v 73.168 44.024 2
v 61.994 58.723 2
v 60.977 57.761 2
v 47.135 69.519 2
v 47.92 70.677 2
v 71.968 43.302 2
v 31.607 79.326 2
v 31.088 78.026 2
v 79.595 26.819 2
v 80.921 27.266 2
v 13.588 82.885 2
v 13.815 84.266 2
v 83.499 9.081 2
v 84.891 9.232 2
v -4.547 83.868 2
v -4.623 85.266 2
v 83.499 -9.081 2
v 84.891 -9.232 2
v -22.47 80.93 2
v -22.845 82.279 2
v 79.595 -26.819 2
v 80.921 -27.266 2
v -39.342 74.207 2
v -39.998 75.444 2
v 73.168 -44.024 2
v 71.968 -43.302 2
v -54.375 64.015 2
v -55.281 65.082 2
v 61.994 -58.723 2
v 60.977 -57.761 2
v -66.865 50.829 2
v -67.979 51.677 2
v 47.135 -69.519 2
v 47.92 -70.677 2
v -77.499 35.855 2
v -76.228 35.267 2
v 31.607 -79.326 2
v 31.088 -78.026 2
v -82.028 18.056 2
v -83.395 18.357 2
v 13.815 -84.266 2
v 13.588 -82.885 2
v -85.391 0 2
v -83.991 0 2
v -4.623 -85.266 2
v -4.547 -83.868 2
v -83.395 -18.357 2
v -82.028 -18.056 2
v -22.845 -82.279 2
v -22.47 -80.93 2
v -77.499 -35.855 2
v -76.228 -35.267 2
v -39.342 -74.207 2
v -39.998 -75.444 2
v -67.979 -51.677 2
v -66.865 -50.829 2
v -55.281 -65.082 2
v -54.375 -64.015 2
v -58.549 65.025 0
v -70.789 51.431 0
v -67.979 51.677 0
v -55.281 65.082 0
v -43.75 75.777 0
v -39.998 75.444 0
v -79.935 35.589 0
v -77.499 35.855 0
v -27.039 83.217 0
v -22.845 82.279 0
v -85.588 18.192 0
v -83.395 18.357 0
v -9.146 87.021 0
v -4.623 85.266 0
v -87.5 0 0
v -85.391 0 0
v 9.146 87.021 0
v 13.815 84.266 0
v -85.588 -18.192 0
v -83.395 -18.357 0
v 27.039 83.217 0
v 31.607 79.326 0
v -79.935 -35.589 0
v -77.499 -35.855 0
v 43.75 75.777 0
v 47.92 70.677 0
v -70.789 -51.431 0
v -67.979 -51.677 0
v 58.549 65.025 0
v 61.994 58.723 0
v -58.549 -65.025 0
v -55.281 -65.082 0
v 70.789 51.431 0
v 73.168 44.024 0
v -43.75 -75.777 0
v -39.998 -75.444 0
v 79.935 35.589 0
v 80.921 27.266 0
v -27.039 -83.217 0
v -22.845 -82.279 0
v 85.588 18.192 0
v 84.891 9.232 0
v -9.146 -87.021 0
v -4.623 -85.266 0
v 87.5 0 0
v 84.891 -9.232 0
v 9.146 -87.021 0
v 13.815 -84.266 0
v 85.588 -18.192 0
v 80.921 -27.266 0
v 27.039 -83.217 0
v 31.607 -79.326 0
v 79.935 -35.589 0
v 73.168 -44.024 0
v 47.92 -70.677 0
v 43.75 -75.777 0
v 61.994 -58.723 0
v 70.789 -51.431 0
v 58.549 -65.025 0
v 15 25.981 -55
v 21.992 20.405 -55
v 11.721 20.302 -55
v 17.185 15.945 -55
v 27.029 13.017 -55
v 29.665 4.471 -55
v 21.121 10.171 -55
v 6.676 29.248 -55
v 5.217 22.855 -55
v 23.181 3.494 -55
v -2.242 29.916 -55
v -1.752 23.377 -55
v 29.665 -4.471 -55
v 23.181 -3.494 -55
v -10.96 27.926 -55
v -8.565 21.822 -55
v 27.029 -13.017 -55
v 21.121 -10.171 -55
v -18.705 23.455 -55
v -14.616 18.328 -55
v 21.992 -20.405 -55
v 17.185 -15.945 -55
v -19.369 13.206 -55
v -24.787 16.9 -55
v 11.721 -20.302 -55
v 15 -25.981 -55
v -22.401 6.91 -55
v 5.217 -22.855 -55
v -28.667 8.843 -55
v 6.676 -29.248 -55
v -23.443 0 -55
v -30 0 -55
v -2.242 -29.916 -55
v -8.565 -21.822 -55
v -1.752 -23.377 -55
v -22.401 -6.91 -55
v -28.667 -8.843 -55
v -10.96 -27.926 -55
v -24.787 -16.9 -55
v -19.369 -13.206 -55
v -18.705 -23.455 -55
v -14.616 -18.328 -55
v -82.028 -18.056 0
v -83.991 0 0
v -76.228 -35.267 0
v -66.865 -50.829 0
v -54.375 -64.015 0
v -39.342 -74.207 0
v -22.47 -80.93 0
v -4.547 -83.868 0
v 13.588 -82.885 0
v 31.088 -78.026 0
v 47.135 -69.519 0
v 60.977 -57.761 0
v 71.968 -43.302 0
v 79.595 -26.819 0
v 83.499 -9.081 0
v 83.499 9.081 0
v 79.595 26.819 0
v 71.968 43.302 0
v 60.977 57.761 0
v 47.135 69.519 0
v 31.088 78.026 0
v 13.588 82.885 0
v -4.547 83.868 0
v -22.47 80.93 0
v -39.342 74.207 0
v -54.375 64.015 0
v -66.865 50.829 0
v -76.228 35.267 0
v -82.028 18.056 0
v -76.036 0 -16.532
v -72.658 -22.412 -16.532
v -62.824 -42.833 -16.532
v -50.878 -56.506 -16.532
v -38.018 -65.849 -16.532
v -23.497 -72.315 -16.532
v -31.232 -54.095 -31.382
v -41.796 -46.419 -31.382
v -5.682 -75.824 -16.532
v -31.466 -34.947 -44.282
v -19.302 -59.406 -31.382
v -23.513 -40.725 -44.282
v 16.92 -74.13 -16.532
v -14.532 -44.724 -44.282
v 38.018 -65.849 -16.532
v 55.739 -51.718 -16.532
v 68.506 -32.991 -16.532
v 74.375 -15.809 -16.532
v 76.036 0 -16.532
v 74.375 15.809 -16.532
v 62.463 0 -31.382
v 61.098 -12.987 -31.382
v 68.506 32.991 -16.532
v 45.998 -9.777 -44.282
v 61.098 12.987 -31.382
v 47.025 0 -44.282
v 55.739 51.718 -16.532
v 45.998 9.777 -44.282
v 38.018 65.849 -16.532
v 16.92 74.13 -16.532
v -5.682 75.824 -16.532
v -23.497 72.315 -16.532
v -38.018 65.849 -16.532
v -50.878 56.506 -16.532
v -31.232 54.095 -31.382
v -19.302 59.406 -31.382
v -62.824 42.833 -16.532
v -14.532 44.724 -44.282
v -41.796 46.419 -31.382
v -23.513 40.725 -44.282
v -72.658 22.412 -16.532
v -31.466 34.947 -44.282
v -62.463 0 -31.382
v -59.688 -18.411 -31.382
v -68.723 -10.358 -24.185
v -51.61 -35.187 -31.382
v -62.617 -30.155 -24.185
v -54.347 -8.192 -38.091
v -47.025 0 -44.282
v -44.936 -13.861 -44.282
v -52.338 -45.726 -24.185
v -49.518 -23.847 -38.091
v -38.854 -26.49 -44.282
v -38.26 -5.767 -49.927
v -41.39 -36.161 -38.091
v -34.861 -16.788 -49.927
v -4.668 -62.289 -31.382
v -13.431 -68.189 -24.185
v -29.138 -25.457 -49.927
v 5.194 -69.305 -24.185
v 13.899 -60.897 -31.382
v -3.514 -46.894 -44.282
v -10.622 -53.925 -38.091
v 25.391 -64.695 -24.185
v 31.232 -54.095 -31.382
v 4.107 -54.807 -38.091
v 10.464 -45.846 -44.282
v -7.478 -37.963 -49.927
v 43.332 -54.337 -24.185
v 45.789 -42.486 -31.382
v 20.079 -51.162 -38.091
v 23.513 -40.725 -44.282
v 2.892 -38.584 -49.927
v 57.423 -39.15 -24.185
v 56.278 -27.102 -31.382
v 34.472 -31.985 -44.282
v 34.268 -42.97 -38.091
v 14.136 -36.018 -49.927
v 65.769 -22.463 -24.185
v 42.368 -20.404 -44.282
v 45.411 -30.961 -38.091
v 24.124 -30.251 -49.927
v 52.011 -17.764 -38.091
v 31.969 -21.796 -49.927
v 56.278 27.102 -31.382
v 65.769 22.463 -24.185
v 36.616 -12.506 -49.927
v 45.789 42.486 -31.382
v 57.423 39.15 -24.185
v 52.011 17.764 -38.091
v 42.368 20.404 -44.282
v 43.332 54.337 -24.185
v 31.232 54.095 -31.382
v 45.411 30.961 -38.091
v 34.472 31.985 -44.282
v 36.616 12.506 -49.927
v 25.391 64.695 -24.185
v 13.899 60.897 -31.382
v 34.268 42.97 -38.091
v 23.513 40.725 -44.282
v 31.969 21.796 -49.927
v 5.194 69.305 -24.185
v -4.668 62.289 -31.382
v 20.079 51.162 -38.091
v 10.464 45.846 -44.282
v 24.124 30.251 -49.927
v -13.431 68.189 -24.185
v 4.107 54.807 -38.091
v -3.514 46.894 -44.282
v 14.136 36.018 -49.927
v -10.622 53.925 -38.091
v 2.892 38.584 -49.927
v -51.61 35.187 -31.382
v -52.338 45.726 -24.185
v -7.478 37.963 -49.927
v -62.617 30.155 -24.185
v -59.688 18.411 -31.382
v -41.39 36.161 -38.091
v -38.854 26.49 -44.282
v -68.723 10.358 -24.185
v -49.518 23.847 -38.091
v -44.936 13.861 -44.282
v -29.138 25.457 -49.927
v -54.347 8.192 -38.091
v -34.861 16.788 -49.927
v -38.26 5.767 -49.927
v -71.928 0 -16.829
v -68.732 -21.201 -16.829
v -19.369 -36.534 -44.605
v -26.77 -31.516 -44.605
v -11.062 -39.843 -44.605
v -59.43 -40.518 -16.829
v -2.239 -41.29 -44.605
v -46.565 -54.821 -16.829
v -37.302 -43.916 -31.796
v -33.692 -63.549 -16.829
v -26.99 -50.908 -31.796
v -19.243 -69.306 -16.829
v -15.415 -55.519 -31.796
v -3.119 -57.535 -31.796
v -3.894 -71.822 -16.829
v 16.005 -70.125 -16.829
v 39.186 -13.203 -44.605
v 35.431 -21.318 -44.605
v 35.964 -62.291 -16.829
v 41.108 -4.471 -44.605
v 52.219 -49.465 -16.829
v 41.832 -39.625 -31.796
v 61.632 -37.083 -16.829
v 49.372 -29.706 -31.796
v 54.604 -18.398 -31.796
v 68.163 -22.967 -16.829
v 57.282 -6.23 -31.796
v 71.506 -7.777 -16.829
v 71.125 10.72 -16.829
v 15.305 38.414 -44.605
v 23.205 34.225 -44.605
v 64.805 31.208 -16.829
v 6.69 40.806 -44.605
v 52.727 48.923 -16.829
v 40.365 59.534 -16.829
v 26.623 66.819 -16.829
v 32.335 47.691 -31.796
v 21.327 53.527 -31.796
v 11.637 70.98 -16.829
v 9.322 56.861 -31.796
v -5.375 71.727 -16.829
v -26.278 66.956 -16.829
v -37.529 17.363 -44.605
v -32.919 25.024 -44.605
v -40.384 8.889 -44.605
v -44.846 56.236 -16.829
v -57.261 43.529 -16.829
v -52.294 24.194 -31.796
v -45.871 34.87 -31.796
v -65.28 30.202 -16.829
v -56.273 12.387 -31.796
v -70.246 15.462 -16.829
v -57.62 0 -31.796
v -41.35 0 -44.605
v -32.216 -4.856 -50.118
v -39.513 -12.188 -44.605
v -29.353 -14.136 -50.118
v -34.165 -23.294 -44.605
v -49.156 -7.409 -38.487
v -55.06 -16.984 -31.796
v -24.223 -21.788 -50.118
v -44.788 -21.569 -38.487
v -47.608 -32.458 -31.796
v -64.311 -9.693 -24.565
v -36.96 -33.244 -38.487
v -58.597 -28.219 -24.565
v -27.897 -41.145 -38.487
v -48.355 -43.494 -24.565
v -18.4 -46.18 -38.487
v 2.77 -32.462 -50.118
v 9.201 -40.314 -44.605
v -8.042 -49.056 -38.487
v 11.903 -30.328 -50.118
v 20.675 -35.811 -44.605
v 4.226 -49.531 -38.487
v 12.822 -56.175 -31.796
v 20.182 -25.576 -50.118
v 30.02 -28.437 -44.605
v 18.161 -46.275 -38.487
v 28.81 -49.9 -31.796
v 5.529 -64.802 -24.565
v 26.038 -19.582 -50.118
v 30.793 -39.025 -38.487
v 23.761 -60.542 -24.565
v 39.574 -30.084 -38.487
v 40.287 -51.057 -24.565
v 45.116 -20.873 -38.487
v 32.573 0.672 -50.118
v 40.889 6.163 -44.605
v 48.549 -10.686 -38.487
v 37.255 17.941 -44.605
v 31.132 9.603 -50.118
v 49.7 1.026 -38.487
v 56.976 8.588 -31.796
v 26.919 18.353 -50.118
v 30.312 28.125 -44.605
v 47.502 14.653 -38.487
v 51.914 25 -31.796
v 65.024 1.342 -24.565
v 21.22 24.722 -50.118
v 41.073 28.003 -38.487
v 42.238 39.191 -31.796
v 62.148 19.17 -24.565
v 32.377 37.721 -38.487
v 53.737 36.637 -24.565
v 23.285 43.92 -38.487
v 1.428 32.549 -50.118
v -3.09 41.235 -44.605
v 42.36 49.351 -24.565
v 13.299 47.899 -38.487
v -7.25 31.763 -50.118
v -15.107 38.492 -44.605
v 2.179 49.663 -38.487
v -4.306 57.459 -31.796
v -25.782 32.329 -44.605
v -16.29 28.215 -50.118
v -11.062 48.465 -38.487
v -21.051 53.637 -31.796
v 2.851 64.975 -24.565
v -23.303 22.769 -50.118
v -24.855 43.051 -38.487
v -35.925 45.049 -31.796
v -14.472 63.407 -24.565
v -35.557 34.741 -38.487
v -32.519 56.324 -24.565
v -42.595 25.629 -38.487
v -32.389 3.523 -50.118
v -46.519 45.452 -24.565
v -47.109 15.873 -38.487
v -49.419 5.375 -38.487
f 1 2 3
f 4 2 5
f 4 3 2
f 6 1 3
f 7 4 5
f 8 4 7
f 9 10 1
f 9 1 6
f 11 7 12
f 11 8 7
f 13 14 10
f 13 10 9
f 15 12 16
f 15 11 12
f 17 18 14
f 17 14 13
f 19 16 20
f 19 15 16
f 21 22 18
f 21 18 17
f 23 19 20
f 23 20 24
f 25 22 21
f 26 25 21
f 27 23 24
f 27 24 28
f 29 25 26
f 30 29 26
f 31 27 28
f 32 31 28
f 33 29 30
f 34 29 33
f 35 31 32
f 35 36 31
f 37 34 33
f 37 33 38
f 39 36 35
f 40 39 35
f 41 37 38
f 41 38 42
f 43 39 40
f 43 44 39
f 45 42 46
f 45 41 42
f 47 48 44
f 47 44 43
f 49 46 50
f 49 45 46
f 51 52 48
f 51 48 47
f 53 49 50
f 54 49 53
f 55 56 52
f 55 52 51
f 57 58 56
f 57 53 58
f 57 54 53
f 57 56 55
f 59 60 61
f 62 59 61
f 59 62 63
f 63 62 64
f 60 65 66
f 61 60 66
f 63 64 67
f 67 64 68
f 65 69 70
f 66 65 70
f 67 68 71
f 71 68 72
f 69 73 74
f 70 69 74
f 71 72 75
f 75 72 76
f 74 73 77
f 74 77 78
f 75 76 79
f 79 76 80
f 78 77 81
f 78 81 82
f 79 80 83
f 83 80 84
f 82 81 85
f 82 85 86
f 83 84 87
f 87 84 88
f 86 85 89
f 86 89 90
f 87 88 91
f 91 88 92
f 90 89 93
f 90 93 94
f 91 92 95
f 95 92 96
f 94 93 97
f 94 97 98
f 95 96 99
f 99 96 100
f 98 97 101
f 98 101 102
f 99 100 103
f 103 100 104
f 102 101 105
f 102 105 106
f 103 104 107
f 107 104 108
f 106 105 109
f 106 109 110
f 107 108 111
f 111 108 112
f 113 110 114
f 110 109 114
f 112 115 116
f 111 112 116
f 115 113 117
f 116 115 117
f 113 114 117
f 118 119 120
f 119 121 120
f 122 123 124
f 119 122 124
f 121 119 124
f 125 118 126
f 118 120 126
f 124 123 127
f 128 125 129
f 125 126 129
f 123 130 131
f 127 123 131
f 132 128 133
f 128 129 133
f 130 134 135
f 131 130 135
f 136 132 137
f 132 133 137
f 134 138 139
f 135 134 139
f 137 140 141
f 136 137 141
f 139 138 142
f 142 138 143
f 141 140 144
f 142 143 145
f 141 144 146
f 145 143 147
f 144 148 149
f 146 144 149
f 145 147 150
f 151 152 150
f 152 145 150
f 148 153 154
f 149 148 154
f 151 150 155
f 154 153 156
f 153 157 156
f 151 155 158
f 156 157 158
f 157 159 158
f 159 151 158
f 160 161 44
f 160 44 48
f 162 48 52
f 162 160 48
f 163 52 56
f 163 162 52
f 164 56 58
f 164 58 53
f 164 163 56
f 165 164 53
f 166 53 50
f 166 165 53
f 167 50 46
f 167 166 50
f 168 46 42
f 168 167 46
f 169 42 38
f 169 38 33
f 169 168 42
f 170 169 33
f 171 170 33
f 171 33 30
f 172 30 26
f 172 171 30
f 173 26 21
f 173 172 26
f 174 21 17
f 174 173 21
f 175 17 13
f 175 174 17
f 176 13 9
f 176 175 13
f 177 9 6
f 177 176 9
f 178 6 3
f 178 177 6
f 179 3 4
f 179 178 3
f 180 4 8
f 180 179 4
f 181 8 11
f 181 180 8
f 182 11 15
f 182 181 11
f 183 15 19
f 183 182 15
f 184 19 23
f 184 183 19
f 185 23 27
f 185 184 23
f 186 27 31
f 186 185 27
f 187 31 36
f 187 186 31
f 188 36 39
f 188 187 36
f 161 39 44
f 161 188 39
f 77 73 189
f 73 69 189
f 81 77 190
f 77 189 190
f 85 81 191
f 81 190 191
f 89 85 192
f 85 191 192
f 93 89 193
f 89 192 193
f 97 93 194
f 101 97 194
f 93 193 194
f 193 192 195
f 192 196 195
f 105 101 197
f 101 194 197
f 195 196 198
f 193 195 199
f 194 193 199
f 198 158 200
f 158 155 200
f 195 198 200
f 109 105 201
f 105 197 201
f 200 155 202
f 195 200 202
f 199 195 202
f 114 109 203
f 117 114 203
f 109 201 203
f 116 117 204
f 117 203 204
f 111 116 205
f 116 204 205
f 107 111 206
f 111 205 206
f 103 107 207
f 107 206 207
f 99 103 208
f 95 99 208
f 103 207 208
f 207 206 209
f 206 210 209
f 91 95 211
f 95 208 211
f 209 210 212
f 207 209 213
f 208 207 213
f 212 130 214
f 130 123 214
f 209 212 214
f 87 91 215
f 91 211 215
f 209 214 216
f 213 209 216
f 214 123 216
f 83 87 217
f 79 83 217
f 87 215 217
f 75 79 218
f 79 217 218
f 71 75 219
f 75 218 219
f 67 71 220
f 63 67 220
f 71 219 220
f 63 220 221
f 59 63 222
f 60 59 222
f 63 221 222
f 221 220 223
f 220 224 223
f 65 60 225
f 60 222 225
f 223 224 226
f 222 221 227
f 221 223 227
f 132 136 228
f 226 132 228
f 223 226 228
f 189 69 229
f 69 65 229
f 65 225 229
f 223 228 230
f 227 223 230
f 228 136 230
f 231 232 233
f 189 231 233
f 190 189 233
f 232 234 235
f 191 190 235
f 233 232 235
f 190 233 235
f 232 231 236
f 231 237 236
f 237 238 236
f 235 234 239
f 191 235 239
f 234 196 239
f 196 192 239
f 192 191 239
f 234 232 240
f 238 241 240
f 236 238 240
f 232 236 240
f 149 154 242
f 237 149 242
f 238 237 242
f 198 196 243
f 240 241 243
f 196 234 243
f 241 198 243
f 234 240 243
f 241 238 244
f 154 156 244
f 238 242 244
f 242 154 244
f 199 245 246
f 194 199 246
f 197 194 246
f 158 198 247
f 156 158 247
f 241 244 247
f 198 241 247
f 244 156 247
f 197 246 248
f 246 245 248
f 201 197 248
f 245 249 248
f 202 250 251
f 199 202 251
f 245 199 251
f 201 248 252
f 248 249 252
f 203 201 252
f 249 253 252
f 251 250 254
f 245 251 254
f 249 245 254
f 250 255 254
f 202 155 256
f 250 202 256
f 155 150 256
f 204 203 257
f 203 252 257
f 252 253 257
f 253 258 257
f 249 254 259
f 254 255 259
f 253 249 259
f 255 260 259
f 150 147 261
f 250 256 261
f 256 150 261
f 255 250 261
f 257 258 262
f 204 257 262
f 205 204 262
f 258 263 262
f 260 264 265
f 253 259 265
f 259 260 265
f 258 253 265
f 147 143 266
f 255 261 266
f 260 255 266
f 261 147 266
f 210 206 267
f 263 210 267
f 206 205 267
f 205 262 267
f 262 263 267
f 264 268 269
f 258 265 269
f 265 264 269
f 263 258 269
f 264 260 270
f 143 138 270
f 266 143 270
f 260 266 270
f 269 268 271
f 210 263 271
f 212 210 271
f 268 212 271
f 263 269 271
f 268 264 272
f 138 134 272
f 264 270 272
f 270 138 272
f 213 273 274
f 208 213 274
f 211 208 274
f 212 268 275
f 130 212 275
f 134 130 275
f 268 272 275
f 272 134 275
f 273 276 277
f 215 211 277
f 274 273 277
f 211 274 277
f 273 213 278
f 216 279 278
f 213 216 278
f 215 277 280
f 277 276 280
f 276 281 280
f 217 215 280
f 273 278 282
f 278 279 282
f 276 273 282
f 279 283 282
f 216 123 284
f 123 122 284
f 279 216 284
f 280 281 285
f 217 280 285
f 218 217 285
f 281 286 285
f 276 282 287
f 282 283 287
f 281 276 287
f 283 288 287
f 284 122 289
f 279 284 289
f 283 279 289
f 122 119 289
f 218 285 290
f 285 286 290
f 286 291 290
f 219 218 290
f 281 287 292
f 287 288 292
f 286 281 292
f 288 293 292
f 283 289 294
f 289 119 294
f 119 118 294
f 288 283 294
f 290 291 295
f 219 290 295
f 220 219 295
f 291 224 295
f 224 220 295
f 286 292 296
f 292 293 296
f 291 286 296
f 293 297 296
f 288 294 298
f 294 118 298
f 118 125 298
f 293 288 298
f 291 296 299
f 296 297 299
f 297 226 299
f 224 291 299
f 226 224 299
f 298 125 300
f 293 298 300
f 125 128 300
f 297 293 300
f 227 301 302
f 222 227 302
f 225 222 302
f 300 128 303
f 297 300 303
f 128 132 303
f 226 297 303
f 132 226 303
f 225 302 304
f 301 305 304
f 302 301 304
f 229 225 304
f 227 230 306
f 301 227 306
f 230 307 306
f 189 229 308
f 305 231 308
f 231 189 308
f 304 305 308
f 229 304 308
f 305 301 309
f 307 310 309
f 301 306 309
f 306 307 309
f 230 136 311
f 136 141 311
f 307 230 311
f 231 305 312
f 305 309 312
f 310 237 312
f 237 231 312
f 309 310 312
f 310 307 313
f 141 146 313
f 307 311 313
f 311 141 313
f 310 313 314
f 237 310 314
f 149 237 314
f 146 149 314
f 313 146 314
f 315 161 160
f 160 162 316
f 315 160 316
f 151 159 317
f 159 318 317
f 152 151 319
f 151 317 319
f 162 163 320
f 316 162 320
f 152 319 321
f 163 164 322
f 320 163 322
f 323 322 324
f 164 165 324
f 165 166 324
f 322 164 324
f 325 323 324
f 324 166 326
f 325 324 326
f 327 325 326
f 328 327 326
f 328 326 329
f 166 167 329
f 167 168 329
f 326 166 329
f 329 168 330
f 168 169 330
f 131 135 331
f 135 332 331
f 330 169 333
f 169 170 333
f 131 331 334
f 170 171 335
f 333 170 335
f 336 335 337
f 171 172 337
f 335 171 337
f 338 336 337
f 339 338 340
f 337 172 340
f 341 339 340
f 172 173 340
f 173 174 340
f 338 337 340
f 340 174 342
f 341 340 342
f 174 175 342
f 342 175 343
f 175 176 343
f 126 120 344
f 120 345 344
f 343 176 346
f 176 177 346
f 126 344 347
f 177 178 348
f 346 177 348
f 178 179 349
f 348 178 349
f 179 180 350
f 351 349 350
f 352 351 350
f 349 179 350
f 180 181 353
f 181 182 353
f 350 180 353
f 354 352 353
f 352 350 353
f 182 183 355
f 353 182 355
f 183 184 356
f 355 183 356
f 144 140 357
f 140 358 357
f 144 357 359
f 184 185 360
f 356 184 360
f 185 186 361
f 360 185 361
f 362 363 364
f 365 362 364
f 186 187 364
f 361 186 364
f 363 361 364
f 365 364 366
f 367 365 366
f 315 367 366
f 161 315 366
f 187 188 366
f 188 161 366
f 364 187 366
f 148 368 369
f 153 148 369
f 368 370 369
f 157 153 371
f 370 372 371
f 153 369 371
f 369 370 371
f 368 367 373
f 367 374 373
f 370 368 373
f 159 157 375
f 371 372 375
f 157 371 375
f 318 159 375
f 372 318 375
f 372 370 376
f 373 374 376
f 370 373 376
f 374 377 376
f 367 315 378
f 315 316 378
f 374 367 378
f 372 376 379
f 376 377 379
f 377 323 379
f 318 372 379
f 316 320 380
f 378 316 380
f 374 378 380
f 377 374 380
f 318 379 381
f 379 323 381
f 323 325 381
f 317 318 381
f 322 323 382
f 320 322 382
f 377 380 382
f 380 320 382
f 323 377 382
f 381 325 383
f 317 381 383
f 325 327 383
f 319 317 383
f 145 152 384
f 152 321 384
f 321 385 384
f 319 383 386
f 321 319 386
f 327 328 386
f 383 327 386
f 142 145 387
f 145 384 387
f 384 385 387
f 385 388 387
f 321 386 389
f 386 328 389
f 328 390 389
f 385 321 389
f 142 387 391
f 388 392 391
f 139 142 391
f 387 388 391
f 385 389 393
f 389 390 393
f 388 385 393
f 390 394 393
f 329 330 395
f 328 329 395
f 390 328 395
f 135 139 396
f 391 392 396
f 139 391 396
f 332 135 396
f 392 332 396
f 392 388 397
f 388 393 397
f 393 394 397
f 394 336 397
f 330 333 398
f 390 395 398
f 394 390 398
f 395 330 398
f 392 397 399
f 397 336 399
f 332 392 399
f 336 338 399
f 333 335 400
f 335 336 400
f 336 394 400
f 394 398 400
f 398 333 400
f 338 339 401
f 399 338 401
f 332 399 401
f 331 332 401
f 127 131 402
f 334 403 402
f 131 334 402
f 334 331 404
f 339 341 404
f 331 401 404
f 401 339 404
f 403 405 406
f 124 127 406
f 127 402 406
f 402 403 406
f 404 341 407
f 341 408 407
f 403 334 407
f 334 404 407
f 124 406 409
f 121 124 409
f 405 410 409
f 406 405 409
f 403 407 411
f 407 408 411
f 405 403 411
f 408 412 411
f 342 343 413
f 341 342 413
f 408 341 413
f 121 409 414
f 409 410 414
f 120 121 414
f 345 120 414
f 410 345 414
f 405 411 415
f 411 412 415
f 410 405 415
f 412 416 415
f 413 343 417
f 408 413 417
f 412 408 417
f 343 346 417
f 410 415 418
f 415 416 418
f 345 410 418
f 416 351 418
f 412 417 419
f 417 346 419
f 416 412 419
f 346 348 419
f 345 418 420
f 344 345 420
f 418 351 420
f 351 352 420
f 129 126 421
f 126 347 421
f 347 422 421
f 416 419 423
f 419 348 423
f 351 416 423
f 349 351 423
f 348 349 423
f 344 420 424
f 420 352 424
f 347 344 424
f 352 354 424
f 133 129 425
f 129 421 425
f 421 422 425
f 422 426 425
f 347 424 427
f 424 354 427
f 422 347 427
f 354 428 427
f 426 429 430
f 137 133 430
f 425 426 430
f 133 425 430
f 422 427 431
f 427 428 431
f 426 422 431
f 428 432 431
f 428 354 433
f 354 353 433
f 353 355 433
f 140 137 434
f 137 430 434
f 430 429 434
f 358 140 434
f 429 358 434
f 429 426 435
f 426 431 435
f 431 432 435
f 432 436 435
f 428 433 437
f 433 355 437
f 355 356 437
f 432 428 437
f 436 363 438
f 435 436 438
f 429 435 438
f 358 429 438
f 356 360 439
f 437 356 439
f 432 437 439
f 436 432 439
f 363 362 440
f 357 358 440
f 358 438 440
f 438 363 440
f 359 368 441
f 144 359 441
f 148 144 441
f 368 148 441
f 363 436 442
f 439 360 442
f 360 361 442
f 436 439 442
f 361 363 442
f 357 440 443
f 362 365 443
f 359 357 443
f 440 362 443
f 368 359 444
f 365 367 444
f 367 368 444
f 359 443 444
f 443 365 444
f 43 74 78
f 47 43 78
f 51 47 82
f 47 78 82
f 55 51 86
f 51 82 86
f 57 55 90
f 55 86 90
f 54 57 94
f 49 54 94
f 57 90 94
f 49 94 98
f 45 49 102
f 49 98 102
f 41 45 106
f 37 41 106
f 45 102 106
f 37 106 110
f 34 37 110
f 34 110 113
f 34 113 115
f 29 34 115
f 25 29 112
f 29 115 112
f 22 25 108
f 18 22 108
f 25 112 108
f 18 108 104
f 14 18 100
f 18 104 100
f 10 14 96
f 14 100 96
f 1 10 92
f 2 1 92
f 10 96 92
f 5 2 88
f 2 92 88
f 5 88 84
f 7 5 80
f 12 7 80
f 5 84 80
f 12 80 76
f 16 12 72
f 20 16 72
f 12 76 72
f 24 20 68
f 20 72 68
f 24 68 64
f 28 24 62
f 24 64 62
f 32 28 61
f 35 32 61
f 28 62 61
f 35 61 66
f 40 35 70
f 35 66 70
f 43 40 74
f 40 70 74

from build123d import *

# Parameters (mm, degrees)
SKETCH4_R           = 85.391174644
SKETCH4_R_2         = 83.991174644
BOSS_EXTRUDE1_DEPTH = 2


with BuildPart() as part:
    # Sketch2 → Revolve1 (revolve)
    with BuildSketch(Plane(origin=(0, 0, 0), x_dir=(1, 0, 0), z_dir=(0, 1, 0)), mode=Mode.PRIVATE) as revolve1_sk:
        with BuildLine():
            Line((30, 55), (23.442880624, 55))
            ThreePointArc((23.442880624, 55), (57.619715582, 31.796383588), (83.991174644, 0))
            Line((83.991174644, 0), (87.5, 0))
            ThreePointArc((87.5, 0), (62.463417443, 31.382209145), (30, 55))
        make_face()
    revolve(revolve1_sk.sketch.rotate(Axis((0, 0, -55), (0, 0, 1)), 180), axis=Axis((0, 0, -55), (0, 0, 1)))

    # Sketch4 → Boss-Extrude1 (add)
    with BuildSketch(Plane.XY):
        with Locations(Location((0, 0, 0), (0, 0, 180))):
            Circle(SKETCH4_R)
        with Locations(Location((0, 0, 0), (0, 0, 180))):
            Circle(SKETCH4_R_2, mode=Mode.SUBTRACT)
    extrude(amount=BOSS_EXTRUDE1_DEPTH)


solid = part.part
